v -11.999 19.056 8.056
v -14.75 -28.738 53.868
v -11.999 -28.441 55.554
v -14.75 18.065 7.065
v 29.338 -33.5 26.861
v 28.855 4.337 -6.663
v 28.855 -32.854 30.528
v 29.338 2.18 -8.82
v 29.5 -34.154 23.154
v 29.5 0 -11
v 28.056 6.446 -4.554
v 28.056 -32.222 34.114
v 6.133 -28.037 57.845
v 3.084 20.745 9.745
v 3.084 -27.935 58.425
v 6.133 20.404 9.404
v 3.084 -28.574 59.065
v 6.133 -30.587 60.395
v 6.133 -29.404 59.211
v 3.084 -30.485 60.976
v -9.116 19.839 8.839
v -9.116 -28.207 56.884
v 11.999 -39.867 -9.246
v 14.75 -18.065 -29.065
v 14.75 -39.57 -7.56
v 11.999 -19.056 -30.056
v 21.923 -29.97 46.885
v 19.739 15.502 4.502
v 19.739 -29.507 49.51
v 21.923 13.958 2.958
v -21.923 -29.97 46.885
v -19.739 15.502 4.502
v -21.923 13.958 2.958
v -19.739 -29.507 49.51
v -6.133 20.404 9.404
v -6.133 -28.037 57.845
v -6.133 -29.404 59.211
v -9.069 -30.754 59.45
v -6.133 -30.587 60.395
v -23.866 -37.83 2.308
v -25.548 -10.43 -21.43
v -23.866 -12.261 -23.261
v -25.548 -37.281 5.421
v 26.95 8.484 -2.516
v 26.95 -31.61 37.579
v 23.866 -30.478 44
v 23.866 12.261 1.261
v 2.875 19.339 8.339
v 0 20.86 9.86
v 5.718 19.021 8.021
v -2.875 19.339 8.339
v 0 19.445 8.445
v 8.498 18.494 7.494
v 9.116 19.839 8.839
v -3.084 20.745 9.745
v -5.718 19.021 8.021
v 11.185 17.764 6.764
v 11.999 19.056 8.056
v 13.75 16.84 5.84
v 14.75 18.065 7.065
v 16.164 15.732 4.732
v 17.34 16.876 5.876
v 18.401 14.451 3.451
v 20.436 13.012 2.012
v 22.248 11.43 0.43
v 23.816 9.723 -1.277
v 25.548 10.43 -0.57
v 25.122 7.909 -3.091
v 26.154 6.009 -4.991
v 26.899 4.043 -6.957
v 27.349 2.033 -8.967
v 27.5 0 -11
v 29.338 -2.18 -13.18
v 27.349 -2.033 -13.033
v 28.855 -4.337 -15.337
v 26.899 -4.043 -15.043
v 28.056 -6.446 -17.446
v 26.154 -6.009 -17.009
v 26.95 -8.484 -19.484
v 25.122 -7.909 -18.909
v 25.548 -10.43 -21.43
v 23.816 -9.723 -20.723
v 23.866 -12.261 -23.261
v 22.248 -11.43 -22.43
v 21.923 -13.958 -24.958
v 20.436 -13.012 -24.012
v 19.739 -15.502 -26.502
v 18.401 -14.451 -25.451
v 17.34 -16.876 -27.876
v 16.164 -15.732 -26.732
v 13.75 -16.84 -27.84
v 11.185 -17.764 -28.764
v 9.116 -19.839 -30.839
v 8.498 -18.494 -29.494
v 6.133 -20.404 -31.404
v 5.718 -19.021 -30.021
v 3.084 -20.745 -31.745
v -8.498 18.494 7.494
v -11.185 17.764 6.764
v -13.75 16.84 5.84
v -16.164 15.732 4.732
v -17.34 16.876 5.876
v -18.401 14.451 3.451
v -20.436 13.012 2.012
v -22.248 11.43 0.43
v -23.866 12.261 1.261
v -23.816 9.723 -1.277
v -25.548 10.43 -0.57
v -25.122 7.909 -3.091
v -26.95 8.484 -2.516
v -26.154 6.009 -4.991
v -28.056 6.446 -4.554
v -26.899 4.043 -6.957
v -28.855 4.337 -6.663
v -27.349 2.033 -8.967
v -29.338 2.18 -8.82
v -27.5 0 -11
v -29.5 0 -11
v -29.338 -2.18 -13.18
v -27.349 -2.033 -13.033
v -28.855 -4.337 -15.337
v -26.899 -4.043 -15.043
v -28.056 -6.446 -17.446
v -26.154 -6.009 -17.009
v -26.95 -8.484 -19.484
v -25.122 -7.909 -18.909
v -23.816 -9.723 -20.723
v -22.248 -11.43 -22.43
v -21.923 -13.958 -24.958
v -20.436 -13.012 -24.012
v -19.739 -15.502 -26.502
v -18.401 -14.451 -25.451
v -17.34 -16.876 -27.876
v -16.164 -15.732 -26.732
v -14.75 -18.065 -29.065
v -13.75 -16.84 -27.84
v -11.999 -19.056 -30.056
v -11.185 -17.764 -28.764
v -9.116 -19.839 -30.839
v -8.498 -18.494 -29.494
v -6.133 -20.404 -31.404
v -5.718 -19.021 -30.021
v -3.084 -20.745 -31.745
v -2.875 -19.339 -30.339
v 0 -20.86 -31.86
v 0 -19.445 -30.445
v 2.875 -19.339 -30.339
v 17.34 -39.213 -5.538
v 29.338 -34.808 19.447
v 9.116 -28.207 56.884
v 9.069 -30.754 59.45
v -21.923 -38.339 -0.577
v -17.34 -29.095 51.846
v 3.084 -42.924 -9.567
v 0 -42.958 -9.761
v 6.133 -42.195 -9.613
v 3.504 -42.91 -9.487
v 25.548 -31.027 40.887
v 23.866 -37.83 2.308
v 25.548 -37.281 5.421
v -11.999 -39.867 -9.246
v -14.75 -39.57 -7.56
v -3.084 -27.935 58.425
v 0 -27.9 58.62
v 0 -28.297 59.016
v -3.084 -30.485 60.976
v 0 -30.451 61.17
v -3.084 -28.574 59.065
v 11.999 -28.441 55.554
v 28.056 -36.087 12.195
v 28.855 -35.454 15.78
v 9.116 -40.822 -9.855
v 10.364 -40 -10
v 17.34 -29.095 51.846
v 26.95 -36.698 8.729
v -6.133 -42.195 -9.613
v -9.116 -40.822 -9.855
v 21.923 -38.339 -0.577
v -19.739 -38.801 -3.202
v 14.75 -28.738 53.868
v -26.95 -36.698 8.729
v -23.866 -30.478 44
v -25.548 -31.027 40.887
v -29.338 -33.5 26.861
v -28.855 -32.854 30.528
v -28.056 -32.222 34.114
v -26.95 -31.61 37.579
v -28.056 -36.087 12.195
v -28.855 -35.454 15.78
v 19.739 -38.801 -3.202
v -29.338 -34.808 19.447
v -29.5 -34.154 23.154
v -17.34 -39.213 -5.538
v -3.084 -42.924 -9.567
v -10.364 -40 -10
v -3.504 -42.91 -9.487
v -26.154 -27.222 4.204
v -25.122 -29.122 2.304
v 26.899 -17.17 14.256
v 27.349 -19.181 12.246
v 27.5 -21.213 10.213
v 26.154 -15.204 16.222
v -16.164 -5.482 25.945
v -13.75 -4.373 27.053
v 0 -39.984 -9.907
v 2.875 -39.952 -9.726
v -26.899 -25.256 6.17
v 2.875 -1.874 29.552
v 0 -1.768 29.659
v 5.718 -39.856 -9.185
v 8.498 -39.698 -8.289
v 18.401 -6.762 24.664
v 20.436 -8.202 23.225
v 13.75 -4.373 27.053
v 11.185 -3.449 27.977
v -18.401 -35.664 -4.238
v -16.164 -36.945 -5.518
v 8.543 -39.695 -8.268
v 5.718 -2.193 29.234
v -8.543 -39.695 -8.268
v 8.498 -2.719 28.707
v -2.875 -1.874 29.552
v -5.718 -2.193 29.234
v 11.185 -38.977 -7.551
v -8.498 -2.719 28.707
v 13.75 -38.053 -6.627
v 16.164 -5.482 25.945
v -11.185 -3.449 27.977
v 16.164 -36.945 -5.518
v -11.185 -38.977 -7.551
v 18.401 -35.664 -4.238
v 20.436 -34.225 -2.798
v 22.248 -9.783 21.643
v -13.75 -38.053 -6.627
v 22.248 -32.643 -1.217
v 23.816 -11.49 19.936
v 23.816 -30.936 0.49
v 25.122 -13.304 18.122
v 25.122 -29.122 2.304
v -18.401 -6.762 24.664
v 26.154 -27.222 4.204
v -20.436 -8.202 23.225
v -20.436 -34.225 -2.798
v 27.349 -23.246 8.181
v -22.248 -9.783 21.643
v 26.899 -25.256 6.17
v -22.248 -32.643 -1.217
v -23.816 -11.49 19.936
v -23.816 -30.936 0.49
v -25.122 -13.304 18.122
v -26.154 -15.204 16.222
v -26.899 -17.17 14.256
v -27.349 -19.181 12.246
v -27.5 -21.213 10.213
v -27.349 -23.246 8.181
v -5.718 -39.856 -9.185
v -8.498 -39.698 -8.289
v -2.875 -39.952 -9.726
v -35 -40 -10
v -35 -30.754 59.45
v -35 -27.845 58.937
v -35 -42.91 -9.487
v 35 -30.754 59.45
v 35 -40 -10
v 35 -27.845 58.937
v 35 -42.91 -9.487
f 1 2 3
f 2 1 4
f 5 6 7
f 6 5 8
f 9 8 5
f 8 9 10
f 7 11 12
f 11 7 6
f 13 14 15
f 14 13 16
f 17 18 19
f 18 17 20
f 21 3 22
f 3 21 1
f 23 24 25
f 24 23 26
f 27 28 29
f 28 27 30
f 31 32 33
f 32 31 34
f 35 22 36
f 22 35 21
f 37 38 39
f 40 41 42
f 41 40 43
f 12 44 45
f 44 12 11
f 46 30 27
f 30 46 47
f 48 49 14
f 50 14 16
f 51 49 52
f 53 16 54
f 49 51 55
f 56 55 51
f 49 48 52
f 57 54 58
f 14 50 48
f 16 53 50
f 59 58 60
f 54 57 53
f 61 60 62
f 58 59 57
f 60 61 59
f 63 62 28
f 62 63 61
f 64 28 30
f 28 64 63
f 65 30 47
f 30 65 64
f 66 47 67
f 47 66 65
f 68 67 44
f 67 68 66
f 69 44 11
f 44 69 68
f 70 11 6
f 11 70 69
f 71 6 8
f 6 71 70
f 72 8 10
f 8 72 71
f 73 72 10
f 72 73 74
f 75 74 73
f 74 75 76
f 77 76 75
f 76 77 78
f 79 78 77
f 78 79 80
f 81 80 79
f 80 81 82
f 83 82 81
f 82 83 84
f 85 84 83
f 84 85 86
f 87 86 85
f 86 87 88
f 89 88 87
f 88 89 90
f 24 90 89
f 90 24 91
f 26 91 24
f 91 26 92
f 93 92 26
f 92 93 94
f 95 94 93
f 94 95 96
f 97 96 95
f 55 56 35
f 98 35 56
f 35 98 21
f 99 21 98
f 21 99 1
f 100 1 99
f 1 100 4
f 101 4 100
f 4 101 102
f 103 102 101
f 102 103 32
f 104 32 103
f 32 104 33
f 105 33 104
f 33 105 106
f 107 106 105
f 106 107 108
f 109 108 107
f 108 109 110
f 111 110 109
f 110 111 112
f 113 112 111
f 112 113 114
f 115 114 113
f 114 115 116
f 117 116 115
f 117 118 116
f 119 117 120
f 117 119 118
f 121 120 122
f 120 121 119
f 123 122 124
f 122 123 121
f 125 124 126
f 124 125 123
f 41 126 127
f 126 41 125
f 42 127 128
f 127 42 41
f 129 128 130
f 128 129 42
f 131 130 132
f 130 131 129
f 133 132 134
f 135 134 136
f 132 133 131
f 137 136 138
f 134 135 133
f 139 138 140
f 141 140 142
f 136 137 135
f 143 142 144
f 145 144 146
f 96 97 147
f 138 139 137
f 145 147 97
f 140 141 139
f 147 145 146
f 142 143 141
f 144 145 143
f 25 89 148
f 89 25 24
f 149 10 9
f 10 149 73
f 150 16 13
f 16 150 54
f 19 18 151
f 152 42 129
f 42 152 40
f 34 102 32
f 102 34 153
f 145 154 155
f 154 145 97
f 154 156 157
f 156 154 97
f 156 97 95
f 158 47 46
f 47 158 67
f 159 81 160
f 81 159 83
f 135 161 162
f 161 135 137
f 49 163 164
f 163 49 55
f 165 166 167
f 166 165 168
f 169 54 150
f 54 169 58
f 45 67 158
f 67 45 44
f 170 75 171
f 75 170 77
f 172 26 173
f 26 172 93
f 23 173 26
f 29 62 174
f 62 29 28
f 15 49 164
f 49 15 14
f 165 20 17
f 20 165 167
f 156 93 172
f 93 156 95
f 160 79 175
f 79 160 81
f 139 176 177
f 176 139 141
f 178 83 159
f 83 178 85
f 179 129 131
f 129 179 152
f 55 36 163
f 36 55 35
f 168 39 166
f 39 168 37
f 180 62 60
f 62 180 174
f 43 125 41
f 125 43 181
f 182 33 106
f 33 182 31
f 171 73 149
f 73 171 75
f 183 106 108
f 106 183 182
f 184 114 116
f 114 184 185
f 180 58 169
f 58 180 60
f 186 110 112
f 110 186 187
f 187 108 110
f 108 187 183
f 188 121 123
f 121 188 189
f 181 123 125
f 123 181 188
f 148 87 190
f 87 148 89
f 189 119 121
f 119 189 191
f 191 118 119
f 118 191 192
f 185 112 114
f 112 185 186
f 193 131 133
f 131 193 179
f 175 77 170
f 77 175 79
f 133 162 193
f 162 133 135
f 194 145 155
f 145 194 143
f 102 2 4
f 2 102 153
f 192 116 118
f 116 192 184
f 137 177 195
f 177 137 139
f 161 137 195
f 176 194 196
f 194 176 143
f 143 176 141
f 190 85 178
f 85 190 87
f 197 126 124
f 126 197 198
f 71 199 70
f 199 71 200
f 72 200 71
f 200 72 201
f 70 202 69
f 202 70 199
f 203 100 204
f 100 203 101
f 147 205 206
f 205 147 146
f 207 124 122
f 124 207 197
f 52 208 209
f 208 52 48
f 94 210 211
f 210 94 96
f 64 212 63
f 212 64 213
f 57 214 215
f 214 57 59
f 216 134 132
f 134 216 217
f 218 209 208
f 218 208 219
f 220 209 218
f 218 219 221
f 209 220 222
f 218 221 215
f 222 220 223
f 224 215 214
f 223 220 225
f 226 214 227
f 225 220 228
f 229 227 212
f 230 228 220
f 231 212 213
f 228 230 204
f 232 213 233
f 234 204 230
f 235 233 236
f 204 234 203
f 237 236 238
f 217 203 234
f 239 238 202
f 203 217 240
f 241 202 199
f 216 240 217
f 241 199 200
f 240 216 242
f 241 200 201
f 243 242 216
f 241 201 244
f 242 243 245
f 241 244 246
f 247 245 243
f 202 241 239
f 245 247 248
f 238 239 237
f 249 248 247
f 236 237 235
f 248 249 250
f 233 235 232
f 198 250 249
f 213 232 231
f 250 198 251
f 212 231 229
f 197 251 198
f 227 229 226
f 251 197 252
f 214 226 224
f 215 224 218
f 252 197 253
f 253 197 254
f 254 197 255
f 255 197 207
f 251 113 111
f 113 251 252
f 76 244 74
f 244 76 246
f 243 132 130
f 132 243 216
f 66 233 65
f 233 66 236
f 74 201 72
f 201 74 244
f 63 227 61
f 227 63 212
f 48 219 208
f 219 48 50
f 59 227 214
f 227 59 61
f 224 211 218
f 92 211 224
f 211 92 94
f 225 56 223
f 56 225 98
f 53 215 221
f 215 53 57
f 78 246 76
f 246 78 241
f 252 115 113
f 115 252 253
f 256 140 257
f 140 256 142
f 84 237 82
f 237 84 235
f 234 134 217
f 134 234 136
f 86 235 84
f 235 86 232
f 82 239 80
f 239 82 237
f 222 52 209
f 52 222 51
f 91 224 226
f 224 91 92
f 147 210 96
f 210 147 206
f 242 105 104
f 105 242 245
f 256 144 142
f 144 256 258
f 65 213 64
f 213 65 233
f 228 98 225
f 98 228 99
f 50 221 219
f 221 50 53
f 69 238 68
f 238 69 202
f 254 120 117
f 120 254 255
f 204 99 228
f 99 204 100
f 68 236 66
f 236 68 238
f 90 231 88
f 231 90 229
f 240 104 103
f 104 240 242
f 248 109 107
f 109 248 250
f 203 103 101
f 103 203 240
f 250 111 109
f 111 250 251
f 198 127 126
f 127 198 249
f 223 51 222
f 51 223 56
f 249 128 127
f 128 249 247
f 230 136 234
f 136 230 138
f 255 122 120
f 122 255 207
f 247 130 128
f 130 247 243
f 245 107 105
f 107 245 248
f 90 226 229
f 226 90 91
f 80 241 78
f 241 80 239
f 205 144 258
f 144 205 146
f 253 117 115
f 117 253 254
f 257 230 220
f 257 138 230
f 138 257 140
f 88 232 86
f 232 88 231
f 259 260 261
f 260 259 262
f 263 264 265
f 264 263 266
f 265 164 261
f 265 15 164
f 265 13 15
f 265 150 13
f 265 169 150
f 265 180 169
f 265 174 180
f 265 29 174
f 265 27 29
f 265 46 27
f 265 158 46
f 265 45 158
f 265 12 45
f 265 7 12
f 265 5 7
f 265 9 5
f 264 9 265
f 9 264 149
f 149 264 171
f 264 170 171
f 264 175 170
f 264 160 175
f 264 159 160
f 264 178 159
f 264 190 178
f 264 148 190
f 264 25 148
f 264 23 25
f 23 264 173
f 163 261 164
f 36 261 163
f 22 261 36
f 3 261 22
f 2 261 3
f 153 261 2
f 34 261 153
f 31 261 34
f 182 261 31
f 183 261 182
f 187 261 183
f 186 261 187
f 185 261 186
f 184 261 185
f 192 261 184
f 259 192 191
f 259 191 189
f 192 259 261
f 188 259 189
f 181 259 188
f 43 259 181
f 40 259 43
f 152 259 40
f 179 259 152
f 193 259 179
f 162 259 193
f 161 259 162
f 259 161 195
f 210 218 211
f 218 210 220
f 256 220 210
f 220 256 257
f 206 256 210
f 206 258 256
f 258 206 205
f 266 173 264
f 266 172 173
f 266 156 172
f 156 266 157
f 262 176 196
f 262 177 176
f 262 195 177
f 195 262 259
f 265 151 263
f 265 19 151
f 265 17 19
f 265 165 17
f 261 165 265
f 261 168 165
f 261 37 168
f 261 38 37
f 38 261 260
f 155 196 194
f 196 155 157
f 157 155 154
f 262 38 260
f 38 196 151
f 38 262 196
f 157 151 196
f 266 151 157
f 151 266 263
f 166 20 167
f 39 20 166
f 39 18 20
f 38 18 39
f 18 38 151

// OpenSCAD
$fn=60;
wall = 2;
pole_rad=45/2;
arm_rad=55/2;

conn_length=30;
conn_angle=45;
conn_extra1=15;

module pole_slieve()
{
    difference()
    {
        union()
        {
            cylinder(r=pole_rad+wall,h=conn_length+conn_extra);
        }
        cylinder(r=pole_rad,h=conn_length);
    }
}

module arm_slieve(ty,conn_extra)
{
    difference()
    {
        cylinder(r=arm_rad+wall,h=conn_length+conn_extra);
        if (ty>0)
        {
            translate([0,0,conn_extra])
            cylinder(r=arm_rad,h=conn_length);
        }
        else
        {
            cylinder(r=arm_rad,h=conn_length);
        }
    }
}

module gate_connector()
{
    difference()
    {
        union()
        {
            pole_slieve();
            translate([0,3,conn_length*1])
            rotate(a=conn_angle,v=[1,0,0])
                arm_slieve(1,conn_extra1);
        }
        cylinder(r=pole_rad,h=conn_length);

    }
}

conn_extra2=45;
module switch_connector()
{
    difference()
    {
        union()
        {
            translate([0,-0,-11])
            rotate(a=conn_angle,v=[1,0,0])
                arm_slieve(0,conn_extra2);
            translate([-35,-40,-10])
                rotate(a=80,v=[1,0,0])
                    cube([70,70,3]);
        }
        translate([-50,-43,-10])
            rotate(a=80,v=[1,0,0])
                cube([90,90,50]);
    }
    
}

//gate_connector();
switch_connector();
